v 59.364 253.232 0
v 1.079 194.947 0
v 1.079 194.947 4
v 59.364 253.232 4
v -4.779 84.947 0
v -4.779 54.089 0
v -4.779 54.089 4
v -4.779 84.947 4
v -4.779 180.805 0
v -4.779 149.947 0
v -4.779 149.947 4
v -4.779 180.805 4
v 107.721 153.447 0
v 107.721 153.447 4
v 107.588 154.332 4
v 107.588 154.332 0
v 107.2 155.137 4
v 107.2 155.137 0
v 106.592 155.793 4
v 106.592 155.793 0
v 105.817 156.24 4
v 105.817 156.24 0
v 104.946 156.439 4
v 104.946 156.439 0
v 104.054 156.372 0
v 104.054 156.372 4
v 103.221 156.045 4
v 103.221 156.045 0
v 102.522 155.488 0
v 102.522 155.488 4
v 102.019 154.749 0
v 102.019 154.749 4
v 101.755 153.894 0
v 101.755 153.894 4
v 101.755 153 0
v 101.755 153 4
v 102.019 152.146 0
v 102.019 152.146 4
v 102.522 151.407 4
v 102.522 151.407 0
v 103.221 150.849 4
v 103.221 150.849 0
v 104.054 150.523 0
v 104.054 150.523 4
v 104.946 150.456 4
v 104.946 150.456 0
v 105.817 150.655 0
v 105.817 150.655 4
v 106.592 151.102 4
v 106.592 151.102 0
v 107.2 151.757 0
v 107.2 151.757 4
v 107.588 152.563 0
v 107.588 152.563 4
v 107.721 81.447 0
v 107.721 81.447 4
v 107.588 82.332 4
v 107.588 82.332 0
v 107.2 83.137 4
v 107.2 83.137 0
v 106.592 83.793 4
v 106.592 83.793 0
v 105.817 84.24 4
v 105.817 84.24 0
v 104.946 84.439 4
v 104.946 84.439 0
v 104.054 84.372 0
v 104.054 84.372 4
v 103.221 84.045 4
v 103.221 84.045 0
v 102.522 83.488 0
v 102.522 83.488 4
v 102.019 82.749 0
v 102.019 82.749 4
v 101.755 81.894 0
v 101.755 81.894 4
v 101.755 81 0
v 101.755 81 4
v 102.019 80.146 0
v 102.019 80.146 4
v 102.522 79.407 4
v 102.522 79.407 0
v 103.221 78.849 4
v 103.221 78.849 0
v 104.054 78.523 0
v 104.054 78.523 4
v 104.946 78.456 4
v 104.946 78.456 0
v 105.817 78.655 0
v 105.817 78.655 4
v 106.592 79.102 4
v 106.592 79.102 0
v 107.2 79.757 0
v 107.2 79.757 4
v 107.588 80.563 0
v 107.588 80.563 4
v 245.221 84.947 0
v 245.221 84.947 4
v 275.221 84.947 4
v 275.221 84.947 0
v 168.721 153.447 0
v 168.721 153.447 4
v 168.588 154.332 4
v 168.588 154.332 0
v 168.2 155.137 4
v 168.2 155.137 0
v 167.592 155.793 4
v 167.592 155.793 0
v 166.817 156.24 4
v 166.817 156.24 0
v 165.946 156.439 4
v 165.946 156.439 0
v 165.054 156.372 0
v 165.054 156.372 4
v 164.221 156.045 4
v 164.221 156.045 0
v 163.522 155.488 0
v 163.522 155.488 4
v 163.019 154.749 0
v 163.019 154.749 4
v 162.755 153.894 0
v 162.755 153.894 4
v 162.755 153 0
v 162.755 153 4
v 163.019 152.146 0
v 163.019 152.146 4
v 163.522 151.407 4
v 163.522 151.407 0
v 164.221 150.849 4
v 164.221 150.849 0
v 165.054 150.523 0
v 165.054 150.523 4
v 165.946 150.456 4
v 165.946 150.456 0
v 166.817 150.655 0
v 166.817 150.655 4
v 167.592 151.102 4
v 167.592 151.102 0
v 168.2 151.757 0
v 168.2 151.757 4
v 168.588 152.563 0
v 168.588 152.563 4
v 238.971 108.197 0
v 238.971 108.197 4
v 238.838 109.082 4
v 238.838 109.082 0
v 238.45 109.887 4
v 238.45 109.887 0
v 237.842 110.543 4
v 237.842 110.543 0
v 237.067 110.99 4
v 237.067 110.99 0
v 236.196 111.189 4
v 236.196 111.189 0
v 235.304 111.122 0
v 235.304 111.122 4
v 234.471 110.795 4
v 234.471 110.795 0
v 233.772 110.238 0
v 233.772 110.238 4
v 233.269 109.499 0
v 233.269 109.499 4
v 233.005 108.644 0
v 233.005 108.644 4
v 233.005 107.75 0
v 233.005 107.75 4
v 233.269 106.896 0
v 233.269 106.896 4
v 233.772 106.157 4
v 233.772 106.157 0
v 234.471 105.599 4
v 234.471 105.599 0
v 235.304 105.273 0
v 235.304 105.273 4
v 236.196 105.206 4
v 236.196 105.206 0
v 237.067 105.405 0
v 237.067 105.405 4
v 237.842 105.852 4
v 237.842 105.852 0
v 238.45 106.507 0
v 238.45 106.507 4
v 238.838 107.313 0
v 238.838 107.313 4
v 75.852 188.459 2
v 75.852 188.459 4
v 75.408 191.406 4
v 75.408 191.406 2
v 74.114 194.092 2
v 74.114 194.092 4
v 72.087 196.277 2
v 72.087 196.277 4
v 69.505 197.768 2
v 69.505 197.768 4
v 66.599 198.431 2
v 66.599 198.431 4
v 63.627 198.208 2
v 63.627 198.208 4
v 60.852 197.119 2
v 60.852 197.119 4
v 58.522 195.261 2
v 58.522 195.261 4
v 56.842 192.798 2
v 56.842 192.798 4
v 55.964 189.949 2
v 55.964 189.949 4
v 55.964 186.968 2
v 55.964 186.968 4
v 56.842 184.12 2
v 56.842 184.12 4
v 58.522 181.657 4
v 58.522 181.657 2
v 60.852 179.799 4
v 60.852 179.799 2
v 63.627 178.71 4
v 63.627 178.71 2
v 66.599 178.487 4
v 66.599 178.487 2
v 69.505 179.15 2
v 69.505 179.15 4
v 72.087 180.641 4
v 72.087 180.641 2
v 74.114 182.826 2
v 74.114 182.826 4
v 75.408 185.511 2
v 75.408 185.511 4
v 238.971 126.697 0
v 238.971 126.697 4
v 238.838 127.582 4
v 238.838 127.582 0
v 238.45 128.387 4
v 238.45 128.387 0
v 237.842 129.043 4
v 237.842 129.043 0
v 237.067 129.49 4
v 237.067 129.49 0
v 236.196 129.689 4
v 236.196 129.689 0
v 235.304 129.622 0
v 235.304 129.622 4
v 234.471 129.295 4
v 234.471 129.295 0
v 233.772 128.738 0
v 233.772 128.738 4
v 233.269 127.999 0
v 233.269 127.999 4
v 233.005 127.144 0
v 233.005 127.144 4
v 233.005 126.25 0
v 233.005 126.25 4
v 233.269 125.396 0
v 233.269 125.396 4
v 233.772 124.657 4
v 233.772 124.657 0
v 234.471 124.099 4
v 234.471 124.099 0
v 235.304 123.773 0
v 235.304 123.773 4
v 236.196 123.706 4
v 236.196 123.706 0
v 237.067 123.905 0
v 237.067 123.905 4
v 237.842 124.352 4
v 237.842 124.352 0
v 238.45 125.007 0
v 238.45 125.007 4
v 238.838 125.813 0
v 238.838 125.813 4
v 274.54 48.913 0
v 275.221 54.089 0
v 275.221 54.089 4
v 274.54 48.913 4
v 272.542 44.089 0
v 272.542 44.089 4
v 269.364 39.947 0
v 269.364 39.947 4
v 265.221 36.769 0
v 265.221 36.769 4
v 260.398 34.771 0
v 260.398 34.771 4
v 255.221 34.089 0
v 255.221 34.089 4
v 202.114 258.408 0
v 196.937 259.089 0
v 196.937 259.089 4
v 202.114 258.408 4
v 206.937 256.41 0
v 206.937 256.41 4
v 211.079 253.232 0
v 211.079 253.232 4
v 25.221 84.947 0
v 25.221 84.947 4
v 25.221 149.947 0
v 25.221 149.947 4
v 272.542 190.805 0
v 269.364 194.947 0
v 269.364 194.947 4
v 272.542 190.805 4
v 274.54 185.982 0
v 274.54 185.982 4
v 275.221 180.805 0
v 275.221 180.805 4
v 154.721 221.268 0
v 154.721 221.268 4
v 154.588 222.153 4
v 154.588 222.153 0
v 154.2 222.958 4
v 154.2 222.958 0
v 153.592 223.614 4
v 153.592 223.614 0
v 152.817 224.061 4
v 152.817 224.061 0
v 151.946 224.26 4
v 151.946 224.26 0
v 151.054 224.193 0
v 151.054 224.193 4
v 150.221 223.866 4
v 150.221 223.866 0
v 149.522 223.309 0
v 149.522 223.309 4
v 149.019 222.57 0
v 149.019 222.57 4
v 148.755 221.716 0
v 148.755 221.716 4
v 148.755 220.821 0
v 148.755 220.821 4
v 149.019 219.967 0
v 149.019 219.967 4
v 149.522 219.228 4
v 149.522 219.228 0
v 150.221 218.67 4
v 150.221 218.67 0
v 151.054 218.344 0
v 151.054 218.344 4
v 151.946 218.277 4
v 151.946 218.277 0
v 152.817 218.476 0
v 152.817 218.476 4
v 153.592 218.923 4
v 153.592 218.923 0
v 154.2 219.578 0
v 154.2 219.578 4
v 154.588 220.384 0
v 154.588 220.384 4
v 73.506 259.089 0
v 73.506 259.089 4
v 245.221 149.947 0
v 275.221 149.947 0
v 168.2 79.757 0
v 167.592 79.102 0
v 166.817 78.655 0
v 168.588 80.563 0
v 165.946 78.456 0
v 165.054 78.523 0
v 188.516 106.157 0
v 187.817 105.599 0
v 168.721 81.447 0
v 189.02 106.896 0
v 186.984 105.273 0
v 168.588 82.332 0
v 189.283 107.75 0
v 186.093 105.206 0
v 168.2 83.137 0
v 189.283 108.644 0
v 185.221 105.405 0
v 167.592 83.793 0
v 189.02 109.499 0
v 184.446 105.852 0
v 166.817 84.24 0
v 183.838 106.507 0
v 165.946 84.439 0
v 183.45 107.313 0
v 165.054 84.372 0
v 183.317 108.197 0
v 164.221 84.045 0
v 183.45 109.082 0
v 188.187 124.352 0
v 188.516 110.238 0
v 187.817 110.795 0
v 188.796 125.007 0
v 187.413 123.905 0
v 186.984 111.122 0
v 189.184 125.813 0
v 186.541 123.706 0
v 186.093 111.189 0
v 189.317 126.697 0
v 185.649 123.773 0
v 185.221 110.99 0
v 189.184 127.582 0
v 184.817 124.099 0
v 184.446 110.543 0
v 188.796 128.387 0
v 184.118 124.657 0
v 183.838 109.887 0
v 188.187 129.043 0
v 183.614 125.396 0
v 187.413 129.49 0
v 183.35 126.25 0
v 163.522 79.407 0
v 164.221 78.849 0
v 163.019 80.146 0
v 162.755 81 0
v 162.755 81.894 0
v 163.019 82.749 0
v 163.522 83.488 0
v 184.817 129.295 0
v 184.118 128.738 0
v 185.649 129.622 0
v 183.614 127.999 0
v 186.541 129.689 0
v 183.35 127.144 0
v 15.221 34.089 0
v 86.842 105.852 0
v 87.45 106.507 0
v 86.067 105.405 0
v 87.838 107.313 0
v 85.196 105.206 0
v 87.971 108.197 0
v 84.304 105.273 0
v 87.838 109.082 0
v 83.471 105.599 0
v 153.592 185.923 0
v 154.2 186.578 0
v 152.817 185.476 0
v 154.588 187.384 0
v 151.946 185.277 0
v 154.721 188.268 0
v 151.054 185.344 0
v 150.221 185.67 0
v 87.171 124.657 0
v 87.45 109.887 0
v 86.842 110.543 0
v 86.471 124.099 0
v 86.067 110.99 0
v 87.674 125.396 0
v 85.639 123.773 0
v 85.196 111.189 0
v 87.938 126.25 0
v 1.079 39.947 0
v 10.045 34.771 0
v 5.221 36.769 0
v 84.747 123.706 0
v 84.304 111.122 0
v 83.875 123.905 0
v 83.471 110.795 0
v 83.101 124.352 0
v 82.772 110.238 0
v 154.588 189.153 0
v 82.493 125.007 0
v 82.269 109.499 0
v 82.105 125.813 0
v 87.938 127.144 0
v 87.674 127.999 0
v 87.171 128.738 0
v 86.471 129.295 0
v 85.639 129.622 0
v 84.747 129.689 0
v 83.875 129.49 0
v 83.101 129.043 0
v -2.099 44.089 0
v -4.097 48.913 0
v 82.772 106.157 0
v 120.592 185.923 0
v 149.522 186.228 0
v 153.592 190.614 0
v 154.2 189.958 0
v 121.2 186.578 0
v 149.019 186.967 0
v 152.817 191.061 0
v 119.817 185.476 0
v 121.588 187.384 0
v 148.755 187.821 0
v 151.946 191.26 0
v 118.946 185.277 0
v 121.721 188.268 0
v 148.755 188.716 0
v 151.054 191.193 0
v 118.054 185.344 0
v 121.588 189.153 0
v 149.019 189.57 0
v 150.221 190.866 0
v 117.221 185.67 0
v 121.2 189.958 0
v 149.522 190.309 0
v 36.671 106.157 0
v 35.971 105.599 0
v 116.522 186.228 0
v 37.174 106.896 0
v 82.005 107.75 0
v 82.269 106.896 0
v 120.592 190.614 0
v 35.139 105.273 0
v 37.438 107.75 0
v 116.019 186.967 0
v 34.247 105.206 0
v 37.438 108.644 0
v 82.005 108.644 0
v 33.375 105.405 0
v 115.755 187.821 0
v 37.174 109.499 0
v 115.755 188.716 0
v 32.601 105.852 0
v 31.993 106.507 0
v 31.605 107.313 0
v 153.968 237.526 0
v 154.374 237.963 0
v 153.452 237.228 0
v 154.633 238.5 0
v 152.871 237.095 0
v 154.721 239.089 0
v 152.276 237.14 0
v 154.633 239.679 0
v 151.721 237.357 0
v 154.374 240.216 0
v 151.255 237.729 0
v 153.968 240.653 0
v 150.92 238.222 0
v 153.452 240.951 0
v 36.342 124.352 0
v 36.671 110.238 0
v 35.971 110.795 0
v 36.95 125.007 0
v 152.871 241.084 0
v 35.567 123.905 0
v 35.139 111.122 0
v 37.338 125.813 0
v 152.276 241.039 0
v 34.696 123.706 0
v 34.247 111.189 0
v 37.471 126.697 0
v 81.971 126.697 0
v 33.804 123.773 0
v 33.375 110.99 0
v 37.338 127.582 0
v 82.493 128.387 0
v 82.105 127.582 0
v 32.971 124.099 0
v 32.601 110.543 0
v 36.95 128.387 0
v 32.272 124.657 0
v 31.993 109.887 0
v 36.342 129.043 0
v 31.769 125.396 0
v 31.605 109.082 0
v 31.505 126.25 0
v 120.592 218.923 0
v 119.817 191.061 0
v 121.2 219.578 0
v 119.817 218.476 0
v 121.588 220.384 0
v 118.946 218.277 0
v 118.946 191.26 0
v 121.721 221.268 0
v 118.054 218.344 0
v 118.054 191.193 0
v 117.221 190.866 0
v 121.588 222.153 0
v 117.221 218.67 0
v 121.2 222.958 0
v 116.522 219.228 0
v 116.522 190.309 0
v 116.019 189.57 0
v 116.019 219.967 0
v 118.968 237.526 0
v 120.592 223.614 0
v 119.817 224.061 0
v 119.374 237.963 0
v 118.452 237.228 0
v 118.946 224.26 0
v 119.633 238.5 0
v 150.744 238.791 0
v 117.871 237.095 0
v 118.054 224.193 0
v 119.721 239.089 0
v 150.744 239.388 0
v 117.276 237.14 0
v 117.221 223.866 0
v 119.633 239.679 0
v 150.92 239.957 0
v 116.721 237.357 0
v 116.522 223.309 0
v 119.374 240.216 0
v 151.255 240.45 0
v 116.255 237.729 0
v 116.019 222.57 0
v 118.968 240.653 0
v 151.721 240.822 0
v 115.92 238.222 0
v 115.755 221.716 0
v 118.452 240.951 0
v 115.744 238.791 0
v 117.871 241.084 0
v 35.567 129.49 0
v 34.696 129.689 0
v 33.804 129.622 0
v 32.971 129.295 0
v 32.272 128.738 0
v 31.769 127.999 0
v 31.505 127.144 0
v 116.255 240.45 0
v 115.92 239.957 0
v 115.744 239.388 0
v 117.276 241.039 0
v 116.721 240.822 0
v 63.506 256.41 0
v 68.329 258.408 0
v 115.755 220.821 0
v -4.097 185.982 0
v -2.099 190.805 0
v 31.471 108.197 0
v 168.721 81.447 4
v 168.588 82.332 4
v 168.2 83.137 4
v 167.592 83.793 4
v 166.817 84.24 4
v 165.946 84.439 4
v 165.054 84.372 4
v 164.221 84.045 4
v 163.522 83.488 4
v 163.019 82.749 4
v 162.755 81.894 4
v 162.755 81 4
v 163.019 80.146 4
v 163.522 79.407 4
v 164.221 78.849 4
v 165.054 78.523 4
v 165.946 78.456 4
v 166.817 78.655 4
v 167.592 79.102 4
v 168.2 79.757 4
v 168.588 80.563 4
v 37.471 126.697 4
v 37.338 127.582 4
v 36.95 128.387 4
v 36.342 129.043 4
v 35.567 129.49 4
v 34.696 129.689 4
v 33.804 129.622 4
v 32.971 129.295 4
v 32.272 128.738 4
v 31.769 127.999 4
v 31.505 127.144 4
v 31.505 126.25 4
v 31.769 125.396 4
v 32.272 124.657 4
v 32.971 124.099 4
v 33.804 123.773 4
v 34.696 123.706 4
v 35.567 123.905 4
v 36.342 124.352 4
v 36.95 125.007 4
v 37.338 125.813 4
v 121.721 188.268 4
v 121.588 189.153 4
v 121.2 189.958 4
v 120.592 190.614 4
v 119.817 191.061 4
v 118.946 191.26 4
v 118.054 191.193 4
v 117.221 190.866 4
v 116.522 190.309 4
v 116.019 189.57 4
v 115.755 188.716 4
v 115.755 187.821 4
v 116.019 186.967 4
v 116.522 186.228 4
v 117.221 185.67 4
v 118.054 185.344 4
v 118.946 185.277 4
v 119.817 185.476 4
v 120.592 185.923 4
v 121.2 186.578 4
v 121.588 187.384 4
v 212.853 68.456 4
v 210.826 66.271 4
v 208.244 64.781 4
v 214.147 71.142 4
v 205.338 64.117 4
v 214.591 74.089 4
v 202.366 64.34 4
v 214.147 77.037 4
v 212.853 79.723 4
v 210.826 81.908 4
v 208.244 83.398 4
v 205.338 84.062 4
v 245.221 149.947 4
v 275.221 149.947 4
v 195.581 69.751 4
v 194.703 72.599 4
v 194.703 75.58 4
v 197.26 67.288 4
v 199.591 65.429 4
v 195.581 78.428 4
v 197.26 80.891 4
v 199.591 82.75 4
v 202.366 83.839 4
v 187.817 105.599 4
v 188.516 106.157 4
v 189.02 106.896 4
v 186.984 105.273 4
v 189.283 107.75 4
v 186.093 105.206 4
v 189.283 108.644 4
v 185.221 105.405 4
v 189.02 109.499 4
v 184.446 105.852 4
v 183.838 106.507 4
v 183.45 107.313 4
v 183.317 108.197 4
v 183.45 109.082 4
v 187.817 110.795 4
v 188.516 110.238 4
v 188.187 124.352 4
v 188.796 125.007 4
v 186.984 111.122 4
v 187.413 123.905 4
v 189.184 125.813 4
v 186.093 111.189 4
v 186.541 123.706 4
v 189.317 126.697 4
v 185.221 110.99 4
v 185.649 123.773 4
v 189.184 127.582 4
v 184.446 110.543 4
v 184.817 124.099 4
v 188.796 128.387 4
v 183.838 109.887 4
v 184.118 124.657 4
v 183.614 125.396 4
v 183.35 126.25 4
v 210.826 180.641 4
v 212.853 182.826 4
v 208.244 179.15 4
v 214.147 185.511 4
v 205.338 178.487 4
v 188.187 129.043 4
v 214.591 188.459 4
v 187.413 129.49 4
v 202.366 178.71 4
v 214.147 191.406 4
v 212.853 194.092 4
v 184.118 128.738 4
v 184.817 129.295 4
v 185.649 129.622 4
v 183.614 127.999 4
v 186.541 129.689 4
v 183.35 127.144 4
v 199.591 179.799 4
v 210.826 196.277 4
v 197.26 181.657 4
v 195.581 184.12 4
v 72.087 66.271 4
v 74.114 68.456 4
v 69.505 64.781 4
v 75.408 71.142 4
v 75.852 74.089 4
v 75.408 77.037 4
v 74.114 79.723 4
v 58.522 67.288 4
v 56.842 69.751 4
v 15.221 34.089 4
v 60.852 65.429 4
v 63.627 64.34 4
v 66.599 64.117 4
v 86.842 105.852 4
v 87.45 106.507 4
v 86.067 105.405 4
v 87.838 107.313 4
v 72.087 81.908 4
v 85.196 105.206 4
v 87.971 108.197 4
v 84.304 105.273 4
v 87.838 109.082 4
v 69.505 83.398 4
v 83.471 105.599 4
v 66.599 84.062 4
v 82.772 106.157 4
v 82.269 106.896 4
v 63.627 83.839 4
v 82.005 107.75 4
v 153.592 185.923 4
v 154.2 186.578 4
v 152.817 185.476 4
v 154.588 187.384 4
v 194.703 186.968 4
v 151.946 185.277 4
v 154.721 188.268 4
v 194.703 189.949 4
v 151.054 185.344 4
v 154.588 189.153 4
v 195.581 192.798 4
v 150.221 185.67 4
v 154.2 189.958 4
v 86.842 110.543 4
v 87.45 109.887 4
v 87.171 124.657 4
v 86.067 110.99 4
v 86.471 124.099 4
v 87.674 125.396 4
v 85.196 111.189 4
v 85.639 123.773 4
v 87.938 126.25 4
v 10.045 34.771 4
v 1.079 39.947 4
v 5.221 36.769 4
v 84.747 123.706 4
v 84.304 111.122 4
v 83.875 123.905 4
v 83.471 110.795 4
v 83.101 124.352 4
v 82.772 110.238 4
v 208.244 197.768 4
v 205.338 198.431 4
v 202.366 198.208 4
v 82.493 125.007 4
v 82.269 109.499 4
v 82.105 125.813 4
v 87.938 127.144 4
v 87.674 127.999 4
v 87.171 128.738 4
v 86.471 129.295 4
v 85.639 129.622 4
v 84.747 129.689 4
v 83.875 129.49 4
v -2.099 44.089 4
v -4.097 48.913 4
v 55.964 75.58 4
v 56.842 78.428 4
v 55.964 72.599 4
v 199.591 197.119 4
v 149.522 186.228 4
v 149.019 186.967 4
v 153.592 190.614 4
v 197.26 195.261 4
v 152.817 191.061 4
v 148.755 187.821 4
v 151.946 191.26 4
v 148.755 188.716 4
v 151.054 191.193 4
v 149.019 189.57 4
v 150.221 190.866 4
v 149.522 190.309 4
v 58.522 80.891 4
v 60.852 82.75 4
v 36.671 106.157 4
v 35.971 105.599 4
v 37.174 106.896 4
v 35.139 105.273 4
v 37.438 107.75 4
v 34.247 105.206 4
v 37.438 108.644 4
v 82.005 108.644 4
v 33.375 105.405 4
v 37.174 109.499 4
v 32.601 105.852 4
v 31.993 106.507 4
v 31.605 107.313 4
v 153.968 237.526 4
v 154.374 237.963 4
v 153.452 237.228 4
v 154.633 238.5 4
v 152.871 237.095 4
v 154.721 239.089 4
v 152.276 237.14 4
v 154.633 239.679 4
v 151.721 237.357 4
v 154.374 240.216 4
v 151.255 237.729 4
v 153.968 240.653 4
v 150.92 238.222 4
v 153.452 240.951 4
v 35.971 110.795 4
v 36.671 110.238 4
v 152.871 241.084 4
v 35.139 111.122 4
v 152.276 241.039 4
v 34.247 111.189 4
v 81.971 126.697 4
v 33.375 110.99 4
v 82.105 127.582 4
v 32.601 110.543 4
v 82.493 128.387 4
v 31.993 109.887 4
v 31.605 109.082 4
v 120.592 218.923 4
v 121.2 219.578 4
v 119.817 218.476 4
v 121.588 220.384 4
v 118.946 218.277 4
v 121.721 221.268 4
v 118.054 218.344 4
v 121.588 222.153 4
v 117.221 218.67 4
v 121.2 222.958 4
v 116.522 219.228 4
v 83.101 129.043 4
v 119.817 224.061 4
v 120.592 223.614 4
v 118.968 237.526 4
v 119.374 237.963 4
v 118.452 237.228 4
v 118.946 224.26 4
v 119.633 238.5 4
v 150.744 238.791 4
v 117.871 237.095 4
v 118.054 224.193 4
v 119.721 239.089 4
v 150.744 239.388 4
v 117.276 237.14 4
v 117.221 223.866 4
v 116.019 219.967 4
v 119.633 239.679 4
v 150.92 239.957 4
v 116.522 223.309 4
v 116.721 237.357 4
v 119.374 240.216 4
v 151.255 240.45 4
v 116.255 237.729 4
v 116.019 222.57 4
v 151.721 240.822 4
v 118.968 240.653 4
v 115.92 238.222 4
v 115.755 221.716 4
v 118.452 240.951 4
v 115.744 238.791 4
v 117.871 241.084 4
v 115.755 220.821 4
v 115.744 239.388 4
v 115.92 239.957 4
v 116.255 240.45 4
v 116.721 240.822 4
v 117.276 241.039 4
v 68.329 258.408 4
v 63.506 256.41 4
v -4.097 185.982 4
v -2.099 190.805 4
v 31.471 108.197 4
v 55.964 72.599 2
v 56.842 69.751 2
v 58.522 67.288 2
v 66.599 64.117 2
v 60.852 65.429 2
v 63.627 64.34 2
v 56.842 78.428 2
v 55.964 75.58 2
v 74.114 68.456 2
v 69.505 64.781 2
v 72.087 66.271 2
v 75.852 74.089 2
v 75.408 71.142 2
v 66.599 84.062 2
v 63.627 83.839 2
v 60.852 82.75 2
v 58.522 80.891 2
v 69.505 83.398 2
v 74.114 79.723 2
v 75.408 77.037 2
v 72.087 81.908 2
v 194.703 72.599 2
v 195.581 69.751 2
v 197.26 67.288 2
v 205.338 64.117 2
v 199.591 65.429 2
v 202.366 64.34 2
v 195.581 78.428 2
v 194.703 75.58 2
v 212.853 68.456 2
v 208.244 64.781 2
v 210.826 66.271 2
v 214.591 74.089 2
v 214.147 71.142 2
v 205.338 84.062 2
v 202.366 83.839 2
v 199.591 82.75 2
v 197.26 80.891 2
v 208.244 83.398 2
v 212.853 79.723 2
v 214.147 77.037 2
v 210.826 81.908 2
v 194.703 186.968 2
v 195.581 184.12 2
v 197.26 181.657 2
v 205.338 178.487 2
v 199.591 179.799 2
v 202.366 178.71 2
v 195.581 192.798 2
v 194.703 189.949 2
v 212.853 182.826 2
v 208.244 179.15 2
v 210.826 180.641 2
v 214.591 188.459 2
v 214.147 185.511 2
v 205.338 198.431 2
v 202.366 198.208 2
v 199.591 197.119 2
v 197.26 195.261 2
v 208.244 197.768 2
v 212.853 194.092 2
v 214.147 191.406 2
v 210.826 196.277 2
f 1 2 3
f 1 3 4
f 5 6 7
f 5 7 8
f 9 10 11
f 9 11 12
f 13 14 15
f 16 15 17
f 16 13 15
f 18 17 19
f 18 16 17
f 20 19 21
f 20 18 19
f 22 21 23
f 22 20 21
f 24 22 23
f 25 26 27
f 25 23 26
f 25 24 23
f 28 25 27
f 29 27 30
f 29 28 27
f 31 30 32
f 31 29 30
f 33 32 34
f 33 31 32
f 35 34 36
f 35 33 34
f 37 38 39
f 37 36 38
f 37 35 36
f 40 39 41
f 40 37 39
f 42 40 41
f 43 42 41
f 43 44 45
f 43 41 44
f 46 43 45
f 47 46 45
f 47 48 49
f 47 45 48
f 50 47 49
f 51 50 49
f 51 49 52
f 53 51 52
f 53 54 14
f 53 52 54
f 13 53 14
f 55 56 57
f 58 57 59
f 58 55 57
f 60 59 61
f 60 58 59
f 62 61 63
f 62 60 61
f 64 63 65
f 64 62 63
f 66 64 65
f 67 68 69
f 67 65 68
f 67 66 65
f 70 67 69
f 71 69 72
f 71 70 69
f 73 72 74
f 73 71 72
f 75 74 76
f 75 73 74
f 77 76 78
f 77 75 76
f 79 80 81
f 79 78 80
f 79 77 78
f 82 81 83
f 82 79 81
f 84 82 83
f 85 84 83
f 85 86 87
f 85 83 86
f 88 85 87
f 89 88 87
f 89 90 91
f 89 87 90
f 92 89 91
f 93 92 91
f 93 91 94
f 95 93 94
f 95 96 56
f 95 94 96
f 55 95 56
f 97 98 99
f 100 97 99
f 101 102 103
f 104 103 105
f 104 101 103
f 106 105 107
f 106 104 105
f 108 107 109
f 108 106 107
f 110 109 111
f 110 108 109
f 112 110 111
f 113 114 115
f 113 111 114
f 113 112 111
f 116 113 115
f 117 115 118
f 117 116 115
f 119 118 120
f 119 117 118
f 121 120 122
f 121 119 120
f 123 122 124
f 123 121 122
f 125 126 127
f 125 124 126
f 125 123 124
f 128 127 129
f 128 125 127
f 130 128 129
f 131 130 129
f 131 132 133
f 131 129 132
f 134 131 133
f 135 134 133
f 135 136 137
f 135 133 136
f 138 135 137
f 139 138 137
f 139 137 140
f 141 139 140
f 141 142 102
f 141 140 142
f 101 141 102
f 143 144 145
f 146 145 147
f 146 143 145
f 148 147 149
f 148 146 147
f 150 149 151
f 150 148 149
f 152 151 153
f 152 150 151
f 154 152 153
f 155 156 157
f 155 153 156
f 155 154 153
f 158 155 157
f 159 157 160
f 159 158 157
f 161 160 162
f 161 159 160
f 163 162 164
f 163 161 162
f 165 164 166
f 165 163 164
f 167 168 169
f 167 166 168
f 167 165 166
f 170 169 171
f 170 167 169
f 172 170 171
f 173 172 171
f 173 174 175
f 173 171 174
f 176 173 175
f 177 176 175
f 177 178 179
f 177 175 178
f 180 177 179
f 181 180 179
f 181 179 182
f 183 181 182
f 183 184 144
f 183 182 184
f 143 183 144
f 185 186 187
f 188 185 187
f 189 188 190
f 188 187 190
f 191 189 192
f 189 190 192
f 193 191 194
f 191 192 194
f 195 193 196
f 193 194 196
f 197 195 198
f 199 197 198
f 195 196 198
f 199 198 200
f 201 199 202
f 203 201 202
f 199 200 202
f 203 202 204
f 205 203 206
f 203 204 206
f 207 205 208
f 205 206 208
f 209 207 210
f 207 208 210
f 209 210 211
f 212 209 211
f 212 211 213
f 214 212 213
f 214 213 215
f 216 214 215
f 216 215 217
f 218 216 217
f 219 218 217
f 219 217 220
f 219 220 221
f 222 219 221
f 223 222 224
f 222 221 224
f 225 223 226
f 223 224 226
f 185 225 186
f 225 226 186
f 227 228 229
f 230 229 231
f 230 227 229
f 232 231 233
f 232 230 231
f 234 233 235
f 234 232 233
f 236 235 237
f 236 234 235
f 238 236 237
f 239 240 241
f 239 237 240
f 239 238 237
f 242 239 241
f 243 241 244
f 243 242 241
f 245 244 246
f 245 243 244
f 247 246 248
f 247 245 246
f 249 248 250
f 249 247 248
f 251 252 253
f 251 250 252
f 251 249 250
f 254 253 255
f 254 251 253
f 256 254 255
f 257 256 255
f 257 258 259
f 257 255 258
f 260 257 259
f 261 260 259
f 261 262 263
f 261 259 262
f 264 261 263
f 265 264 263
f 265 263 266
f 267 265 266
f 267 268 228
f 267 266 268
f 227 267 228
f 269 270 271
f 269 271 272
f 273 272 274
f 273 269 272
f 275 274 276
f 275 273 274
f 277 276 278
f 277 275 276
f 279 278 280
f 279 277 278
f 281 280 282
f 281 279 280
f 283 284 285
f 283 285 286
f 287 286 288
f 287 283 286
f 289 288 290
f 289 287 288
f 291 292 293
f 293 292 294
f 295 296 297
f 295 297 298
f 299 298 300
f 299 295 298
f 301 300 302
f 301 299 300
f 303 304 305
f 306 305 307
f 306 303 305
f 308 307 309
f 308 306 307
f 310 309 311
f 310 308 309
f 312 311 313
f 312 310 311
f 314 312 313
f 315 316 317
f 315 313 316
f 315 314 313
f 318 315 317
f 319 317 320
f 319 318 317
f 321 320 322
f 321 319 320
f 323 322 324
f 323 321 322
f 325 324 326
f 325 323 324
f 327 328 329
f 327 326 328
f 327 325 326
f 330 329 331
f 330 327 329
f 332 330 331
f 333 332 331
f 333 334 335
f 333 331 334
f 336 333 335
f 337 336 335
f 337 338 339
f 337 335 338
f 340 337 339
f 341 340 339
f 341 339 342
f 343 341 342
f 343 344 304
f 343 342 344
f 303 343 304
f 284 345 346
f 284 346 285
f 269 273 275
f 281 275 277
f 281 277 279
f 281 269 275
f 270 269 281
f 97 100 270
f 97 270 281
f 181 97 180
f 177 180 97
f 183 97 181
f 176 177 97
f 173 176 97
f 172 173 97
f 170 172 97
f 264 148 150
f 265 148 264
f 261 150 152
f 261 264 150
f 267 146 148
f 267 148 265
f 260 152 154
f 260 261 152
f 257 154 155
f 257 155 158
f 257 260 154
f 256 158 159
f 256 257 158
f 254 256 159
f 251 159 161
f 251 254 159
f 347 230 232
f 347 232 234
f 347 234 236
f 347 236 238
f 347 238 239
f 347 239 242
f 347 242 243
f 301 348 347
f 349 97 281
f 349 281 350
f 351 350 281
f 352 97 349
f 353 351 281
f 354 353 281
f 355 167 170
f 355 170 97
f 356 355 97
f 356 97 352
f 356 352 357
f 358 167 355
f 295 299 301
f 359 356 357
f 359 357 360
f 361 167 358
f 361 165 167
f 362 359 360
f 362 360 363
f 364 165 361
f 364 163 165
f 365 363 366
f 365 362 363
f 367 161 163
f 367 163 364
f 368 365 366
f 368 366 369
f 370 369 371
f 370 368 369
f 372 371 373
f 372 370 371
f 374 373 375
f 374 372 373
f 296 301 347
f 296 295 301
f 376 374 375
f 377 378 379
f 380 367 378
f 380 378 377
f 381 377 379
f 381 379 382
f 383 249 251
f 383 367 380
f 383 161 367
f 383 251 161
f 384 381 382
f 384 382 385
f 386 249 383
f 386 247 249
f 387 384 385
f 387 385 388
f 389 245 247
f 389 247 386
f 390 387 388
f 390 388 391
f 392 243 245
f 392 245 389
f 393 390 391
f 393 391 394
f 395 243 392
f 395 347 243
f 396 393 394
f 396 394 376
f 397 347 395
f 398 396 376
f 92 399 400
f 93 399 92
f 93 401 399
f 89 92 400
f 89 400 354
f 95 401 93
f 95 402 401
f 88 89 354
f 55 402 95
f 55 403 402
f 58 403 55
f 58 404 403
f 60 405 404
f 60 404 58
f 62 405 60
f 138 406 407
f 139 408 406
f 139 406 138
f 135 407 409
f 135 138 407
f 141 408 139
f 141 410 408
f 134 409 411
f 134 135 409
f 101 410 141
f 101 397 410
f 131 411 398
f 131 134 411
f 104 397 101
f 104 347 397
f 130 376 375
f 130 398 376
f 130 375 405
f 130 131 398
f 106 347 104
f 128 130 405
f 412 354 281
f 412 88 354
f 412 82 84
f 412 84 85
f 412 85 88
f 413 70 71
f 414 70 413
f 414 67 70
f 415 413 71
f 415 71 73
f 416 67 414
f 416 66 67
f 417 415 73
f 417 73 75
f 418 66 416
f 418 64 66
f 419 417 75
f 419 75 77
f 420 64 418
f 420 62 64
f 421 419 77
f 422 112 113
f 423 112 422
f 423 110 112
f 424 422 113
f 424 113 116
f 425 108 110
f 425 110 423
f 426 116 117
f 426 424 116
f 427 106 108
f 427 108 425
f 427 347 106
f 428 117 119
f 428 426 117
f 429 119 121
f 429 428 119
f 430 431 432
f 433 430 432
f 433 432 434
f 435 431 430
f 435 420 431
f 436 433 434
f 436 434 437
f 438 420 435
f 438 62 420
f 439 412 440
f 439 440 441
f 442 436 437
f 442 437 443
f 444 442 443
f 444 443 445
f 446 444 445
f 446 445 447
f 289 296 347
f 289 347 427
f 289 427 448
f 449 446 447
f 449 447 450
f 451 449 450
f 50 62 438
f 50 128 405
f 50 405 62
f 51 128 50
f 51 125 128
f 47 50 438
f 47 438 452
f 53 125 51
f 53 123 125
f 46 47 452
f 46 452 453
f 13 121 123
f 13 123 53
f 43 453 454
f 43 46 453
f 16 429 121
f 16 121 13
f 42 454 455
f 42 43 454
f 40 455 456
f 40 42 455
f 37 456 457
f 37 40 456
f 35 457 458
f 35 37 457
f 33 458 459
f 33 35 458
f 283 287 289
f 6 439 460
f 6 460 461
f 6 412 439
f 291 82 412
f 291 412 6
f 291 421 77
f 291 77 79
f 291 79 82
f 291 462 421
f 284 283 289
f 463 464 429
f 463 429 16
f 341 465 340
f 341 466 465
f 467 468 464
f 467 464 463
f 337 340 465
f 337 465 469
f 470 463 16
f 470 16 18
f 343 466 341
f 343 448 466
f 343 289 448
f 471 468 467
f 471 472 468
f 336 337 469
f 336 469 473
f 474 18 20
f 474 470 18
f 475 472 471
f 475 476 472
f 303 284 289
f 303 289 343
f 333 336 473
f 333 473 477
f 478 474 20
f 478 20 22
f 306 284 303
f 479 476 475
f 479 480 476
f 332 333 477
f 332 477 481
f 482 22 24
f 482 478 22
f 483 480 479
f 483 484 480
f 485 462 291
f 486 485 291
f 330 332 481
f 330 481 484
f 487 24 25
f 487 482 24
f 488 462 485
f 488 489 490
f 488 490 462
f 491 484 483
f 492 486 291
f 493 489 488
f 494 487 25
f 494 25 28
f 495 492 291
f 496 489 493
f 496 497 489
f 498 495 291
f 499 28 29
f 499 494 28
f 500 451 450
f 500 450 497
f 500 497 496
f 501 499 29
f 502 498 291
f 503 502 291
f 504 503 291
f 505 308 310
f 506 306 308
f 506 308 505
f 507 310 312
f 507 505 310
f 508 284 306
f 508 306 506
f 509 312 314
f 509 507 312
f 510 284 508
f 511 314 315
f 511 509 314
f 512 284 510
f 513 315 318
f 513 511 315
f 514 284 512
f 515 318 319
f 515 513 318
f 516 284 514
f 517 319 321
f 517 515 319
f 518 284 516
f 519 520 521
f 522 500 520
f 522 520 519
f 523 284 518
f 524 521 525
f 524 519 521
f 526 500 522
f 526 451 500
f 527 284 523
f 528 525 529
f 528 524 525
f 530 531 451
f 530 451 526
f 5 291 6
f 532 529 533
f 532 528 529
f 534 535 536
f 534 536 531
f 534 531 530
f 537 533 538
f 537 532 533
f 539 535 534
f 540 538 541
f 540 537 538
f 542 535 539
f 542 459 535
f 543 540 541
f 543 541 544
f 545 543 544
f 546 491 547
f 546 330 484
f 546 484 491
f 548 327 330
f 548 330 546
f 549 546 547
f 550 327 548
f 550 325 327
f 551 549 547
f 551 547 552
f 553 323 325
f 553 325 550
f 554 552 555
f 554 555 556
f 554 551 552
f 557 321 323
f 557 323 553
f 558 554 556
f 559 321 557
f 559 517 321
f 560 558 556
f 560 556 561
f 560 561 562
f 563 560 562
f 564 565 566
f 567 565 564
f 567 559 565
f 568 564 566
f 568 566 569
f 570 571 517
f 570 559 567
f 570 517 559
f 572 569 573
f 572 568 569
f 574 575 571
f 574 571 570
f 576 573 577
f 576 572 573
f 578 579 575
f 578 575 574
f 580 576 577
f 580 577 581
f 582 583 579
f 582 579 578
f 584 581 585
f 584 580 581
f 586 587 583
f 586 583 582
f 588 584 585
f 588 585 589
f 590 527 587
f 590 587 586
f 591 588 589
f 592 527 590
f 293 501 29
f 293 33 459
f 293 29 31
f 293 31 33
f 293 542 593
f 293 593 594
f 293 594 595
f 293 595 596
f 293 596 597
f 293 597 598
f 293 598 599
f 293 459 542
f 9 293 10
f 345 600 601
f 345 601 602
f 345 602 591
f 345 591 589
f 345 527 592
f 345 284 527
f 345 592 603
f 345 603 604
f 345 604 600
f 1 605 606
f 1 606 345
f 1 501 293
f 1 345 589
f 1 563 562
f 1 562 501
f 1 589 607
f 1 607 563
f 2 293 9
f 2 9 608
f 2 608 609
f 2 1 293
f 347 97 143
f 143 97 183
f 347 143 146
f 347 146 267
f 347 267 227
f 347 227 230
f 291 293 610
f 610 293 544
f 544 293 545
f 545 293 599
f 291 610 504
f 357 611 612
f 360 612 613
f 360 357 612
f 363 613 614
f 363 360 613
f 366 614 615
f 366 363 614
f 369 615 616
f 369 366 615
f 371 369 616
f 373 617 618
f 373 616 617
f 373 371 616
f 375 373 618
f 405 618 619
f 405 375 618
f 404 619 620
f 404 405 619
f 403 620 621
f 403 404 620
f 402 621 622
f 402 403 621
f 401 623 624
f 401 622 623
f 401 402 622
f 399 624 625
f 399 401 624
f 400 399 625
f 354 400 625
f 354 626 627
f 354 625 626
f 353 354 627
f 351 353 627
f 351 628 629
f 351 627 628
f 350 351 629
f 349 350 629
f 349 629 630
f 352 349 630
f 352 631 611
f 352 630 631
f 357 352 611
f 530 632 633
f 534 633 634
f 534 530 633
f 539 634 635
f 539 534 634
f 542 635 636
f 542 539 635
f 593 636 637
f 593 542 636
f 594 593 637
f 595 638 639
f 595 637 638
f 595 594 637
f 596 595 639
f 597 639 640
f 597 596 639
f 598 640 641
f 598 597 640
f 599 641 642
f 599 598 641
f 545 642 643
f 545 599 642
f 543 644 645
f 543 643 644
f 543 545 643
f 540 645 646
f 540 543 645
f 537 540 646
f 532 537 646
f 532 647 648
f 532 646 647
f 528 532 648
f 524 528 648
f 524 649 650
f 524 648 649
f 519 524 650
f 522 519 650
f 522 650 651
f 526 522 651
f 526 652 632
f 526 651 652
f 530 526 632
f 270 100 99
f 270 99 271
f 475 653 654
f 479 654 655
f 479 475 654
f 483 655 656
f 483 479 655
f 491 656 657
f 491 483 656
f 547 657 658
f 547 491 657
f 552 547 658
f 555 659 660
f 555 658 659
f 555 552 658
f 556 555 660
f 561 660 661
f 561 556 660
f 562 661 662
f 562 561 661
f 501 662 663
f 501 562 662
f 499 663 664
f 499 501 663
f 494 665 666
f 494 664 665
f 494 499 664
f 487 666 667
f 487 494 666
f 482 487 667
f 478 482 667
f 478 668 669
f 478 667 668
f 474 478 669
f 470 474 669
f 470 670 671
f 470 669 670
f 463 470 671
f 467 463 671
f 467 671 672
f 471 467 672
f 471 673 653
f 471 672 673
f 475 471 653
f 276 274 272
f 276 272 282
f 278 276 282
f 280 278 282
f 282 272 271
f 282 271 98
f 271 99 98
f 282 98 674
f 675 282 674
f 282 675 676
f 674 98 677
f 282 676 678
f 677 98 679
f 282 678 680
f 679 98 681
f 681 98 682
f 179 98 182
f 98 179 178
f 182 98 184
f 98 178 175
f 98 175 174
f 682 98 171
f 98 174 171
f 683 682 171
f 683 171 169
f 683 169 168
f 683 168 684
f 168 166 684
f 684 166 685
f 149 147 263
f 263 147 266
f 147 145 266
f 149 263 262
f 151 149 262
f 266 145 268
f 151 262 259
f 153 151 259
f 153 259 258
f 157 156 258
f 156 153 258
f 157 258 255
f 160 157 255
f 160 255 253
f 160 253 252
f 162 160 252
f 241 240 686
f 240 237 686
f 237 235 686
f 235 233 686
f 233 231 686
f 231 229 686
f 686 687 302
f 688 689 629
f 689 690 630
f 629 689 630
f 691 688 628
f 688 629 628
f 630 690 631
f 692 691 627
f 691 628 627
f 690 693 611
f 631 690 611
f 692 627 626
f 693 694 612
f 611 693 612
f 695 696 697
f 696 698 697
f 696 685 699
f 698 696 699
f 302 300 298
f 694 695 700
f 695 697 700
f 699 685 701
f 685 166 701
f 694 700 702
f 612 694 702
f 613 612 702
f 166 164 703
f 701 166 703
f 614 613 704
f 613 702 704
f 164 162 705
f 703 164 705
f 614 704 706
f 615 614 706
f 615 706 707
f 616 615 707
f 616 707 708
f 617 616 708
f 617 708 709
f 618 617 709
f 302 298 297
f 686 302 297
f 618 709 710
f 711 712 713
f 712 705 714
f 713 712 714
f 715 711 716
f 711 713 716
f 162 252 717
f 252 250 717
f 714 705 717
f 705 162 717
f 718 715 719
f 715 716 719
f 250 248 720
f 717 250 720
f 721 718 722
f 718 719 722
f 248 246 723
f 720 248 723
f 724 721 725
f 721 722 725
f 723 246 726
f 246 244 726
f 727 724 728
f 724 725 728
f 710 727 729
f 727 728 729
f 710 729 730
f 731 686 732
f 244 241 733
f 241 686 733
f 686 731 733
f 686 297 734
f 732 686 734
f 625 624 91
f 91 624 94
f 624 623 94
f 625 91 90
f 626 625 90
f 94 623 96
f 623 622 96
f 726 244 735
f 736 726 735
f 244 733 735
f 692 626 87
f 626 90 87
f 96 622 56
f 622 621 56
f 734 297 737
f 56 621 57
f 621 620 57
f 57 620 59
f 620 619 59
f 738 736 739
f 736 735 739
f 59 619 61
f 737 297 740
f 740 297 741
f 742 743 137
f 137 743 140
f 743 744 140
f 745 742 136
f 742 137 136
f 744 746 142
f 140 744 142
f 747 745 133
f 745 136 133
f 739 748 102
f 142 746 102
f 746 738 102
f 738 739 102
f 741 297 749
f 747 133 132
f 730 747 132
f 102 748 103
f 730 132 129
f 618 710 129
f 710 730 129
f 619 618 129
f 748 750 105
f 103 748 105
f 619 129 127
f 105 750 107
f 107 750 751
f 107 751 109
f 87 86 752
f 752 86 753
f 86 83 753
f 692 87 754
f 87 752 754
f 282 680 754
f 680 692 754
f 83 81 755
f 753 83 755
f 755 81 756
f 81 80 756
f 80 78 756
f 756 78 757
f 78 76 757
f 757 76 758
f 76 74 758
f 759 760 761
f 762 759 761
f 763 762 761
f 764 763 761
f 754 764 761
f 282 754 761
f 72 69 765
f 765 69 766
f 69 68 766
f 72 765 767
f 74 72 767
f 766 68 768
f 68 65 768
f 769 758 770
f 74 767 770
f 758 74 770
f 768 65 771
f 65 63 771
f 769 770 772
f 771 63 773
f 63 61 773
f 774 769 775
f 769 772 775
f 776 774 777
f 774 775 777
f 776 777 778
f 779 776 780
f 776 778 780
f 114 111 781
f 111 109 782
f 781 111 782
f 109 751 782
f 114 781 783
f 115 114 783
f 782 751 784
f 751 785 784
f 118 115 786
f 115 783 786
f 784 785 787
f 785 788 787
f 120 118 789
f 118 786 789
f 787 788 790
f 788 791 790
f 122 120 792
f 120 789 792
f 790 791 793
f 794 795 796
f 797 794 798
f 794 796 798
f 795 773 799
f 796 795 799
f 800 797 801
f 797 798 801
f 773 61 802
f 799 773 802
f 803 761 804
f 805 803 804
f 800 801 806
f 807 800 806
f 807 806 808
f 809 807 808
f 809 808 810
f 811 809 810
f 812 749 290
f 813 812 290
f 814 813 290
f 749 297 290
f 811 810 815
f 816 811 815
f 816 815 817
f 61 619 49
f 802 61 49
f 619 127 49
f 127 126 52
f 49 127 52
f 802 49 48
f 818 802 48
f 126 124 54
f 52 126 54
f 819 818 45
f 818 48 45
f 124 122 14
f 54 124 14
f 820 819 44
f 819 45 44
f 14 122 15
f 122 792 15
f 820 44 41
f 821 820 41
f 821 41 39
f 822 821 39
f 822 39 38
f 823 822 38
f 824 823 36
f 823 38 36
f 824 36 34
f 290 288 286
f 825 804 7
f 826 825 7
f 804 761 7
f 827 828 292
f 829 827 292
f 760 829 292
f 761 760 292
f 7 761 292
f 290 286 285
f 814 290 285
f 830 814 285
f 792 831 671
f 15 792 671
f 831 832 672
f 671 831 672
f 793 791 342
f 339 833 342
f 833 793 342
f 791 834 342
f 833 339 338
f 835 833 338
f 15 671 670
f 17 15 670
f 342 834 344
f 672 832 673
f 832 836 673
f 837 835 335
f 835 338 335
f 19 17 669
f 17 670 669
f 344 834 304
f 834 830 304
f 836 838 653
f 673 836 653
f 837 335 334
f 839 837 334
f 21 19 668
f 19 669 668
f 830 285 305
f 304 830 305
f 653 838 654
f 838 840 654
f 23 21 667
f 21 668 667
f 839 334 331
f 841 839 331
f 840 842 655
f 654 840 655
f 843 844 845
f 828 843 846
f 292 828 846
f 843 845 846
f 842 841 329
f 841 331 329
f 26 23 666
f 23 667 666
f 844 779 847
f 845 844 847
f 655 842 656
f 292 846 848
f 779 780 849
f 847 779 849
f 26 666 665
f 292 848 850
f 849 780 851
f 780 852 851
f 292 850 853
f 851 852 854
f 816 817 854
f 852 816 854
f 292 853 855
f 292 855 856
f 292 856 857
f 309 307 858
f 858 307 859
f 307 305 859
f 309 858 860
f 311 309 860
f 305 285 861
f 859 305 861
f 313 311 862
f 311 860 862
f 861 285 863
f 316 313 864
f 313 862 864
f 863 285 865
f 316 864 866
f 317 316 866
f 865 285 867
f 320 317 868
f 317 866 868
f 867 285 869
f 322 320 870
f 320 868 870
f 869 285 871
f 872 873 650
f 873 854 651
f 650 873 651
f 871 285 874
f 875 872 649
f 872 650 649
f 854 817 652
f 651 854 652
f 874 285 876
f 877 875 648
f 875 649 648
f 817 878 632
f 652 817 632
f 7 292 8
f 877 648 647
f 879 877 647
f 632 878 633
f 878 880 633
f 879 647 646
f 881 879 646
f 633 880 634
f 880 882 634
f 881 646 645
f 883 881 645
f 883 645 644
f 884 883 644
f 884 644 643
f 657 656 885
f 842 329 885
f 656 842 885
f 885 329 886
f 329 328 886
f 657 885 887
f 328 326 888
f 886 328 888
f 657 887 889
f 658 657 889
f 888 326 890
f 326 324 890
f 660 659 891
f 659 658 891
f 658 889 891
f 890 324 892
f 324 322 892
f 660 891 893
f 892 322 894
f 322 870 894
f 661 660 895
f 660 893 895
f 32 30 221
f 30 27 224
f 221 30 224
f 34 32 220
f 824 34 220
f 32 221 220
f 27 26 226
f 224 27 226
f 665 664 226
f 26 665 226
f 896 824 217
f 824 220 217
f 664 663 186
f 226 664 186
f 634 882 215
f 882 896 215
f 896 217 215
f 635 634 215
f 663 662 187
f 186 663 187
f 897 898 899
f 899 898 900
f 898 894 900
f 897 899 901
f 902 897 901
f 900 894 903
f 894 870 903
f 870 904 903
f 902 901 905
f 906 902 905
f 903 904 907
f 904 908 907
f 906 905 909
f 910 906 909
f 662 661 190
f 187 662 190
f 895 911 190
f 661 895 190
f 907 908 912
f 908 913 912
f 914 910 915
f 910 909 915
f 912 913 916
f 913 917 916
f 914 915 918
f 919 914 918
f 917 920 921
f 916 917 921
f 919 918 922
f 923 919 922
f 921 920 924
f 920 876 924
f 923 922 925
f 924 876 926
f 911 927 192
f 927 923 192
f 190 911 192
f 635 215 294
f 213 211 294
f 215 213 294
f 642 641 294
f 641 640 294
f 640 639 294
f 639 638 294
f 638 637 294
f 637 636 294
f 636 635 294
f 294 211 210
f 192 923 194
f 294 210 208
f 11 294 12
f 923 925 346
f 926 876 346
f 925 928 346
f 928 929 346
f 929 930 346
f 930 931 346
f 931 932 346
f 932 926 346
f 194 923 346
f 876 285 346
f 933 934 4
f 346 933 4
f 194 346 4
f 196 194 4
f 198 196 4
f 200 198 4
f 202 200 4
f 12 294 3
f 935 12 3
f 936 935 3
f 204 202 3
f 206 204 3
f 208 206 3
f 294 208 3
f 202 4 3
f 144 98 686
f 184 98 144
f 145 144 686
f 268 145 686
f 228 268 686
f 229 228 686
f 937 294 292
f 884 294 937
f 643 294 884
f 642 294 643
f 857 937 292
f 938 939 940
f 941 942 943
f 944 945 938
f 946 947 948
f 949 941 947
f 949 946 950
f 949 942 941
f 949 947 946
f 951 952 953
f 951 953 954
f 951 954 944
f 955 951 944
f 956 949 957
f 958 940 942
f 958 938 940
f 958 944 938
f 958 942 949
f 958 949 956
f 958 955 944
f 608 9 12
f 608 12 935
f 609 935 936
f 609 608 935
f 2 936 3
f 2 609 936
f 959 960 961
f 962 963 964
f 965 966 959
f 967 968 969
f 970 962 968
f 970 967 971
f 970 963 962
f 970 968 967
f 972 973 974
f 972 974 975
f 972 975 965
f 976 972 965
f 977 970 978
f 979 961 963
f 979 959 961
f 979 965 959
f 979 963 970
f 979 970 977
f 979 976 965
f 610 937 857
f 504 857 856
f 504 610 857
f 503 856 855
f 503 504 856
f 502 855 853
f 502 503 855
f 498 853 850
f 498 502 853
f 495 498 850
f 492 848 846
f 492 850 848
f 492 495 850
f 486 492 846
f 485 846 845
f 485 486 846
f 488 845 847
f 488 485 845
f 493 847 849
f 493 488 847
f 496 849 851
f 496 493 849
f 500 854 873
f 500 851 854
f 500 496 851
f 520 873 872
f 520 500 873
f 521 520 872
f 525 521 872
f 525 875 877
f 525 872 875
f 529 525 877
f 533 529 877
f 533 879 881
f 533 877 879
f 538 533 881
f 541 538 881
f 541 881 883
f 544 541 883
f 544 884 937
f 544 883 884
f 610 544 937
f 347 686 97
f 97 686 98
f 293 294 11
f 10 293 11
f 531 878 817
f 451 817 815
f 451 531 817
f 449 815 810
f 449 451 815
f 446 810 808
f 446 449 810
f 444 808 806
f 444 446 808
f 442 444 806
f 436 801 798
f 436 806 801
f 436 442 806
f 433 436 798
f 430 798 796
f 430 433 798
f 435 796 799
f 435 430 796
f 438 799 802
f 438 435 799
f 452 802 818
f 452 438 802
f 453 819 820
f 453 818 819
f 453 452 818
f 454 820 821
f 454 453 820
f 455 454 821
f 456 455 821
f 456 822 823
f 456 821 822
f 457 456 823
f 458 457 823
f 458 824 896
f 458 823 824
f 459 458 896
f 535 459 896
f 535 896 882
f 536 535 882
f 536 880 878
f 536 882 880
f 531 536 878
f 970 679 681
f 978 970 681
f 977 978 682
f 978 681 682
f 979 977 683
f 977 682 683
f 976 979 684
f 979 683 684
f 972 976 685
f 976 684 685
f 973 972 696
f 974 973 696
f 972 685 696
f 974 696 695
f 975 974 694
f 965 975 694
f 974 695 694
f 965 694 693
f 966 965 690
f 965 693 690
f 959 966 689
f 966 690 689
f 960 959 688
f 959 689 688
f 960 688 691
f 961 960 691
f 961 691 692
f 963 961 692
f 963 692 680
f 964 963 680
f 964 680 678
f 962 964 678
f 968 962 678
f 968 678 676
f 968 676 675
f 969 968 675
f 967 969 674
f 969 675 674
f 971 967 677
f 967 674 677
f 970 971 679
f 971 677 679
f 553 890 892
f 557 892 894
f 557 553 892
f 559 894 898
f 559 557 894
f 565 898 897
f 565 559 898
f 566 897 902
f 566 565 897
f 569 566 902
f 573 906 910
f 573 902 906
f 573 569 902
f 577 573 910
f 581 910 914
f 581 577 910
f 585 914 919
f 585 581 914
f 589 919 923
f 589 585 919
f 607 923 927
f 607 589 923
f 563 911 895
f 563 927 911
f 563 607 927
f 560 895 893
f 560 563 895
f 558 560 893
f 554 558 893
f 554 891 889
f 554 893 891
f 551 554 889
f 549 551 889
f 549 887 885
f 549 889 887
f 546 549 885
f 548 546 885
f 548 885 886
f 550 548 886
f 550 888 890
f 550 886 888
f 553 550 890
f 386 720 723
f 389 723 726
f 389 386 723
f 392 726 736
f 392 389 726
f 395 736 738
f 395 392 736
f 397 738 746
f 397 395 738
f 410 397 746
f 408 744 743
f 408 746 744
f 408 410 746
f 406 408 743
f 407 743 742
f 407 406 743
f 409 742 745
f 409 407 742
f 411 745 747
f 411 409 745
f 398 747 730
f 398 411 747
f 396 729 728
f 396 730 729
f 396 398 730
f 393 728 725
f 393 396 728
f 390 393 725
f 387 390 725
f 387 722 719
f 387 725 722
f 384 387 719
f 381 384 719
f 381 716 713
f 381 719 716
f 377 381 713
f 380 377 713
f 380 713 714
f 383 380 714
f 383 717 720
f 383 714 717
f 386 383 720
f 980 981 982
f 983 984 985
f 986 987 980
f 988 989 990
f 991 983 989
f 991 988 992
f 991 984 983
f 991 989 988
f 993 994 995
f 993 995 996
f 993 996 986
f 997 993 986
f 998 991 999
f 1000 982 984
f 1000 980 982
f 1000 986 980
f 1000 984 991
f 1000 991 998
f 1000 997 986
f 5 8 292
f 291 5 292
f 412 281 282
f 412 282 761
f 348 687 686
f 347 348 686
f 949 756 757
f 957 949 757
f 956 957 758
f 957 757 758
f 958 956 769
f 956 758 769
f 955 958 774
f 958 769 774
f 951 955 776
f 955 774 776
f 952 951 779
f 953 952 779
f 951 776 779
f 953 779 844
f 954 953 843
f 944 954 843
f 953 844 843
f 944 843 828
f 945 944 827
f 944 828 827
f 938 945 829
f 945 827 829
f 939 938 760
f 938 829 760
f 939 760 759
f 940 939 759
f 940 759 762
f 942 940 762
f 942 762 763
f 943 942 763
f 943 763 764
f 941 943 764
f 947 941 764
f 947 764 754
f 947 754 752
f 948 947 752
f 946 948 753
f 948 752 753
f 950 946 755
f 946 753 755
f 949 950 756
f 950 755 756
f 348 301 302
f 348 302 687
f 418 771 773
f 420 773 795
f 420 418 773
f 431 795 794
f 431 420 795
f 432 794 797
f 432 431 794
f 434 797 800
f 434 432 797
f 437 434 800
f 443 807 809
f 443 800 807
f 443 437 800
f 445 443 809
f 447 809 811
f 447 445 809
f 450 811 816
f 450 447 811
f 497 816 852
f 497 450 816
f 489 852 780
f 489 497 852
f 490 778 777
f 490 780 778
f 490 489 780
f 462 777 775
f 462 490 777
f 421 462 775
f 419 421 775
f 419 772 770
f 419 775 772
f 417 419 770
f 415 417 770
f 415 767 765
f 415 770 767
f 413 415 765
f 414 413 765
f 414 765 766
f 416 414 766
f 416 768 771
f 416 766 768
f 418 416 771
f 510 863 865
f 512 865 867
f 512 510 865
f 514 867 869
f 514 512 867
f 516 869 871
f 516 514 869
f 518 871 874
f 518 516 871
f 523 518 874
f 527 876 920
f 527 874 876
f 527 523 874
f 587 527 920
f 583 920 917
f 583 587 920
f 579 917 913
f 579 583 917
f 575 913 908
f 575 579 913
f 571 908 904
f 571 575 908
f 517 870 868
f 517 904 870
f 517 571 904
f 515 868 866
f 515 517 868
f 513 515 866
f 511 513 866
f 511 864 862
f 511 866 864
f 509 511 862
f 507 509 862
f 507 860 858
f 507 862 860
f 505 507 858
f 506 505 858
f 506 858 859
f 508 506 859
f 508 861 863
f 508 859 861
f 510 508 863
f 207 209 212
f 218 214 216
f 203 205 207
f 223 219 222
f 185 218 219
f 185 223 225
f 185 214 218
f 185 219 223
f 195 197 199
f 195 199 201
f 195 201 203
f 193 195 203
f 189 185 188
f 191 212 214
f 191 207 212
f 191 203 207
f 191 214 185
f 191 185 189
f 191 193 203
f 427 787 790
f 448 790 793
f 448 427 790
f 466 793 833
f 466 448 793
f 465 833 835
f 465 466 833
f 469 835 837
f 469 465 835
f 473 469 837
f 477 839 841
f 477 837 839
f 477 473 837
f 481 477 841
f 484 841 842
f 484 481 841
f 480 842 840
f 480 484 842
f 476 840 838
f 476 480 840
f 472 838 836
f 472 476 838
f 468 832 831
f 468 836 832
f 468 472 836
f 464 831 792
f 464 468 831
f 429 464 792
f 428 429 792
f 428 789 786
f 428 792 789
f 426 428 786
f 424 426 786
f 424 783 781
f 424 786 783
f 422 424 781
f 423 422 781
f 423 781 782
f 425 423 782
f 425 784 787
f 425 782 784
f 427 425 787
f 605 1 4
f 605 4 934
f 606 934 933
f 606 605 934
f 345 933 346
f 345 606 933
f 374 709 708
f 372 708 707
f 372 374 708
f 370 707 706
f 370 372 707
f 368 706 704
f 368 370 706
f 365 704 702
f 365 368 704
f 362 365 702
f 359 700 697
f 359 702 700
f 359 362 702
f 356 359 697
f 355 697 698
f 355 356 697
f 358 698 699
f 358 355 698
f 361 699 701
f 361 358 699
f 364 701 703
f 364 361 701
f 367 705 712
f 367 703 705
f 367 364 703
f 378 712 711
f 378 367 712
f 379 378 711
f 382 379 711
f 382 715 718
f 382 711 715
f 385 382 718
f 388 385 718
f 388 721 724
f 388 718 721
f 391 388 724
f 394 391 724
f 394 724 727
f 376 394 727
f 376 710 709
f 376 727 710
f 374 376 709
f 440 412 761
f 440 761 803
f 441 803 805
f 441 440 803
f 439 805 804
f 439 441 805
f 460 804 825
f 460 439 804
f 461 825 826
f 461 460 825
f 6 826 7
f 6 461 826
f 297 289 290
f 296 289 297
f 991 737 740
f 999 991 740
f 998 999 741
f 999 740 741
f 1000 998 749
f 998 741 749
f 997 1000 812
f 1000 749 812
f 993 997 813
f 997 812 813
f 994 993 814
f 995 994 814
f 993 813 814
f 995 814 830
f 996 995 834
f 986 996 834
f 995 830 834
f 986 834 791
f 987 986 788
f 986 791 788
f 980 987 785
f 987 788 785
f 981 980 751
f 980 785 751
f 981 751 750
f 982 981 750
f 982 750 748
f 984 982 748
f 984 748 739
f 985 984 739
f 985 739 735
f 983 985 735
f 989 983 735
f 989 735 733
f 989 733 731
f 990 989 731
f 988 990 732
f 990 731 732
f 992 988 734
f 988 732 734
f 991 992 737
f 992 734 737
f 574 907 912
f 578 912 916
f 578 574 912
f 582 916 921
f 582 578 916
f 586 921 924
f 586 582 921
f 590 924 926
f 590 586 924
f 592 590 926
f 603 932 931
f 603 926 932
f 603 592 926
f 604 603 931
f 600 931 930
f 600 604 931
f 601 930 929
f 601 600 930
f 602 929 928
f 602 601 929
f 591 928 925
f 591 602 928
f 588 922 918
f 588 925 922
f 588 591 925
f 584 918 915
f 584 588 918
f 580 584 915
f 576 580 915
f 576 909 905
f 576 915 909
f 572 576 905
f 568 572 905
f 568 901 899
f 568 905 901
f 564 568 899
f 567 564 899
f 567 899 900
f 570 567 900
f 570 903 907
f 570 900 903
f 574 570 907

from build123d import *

# Parameters (mm, degrees)
EXTRUDE_1_DEPTH      = 4
SKETCH_1950_R        = 3
CUT_EXTRUDE_3_DEPTH  = 10
L298N_R              = 3
CUT_EXTRUDE_5_DEPTH  = 10
SKETCH_486_R         = 3
CUT_EXTRUDE_7_DEPTH  = 10
CUT_EXTRUDE_8_DEPTH  = 10
SKETCH_2788_R        = 2
CUT_EXTRUDE_10_DEPTH = 10
SKETCH_11_R          = 10
CUT_EXTRUDE_11_DEPTH = 2


with BuildPart() as part:
    # 草图3 → 凸台-拉伸1 (new body)
    with BuildSketch(Plane.XY):
        with BuildLine():
            Line((73.505746565, 259.089488009), (196.937204075, 259.089488009))
            ThreePointArc((196.937204075, 259.089488009), (204.590872722, 257.56707866), (211.079339699, 253.231623633))
            Line((211.079339699, 253.231623633), (269.363610946, 194.947352386))
            ThreePointArc((269.363610946, 194.947352386), (273.699065973, 188.458885409), (275.221475323, 180.805216762))
            Line((275.221475323, 180.805216762), (275.221475323, 54.089488009))
            ThreePointArc((275.221475323, 54.089488009), (269.363610946, 39.947352386), (255.221475323, 34.089488009))
            Line((255.221475323, 34.089488009), (15.221475318, 34.089488009))
            ThreePointArc((15.221475318, 34.089488009), (1.079339694, 39.947352386), (-4.778524682, 54.089488009))
            Line((-4.778524682, 54.089488009), (-4.778524682, 180.805216762))
            ThreePointArc((-4.778524682, 180.805216762), (-3.256115333, 188.458885409), (1.079339694, 194.947352386))
            Line((1.079339694, 194.947352386), (59.363610941, 253.231623633))
            ThreePointArc((59.363610941, 253.231623633), (65.852077918, 257.56707866), (73.505746565, 259.089488009))
        make_face()
    extrude(amount=EXTRUDE_1_DEPTH)

    # Sketch 1950 → 切除-拉伸3 (cut)
    with BuildSketch(Plane.XY):
        with Locations((235.971475323, 126.697352386)):
            Circle(SKETCH_1950_R)
        with Locations((186.316790846, 126.697352386)):
            Circle(SKETCH_1950_R)
        with Locations((84.971475318, 108.197352386)):
            Circle(SKETCH_1950_R)
        with Locations((235.971475323, 108.197352386)):
            Circle(SKETCH_1950_R)
        with Locations(Location((186.316790846, 108.197352386, 0), (0, 0, 180))):
            Circle(SKETCH_1950_R)
        with Locations(Location((84.971475318, 126.697352386, 0), (0, 0, 180))):
            Circle(SKETCH_1950_R)
        with Locations((34.471475318, 126.697352386)):
            Circle(SKETCH_1950_R)
        with Locations(Location((34.471475318, 108.197352386, 0), (0, 0, 180))):
            Circle(SKETCH_1950_R)
    extrude(amount=CUT_EXTRUDE_3_DEPTH, mode=Mode.SUBTRACT)

    # L298N → 切除-拉伸5 (cut)
    with BuildSketch(Plane.XY):
        with Locations((118.72147532, 188.268420197)):
            Circle(L298N_R)
        with Locations((118.72147532, 221.268420197)):
            Circle(L298N_R)
        with Locations((151.72147532, 221.268420197)):
            Circle(L298N_R)
        with Locations((151.72147532, 188.268420197)):
            Circle(L298N_R)
    extrude(amount=CUT_EXTRUDE_5_DEPTH, mode=Mode.SUBTRACT)

    # Sketch 486 → 切除-拉伸7 (cut)
    with BuildSketch(Plane.XY):
        with Locations((104.72147532, 153.447352386)):
            Circle(SKETCH_486_R)
        with Locations((104.72147532, 81.447352386)):
            Circle(SKETCH_486_R)
        with Locations((165.72147532, 81.447352386)):
            Circle(SKETCH_486_R)
        with Locations((165.72147532, 153.447352386)):
            Circle(SKETCH_486_R)
    extrude(amount=CUT_EXTRUDE_7_DEPTH, mode=Mode.SUBTRACT)

    # Sketch 1082 → 切除-拉伸8 (cut)
    with BuildSketch(Plane.XY.offset(4)):
        Polygon((-4.778524682, 149.947352386), (-4.778524682, 84.947352386), (25.221475318, 84.947352386), (25.221475318, 149.947352386), (7.221475318, 149.947352386), align=None)
        Polygon((245.221475323, 149.947352386), (245.221475323, 84.947352386), (275.221475323, 84.947352386), (275.221475323, 149.947352386), (263.221475323, 149.947352386), align=None)
    extrude(amount=-CUT_EXTRUDE_8_DEPTH, mode=Mode.SUBTRACT)

    # Sketch 2788 → 切除-拉伸10 (cut)
    with BuildSketch(Plane.XY):
        with Locations((117.72147532, 239.089488009)):
            Circle(SKETCH_2788_R)
        with Locations((152.72147532, 239.089488009)):
            Circle(SKETCH_2788_R)
    extrude(amount=CUT_EXTRUDE_10_DEPTH, mode=Mode.SUBTRACT)

    # 草图11 → 切除-拉伸11 (cut)
    with BuildSketch(Plane.XY.offset(4)):
        with Locations((65.852077918, 188.458885409)):
            Circle(SKETCH_11_R)
        with Locations((204.590872722, 188.458885409)):
            Circle(SKETCH_11_R)
        with Locations((65.852077918, 74.089488009)):
            Circle(SKETCH_11_R)
        with Locations((204.590872722, 74.089488009)):
            Circle(SKETCH_11_R)
    extrude(amount=-CUT_EXTRUDE_11_DEPTH, mode=Mode.SUBTRACT)


solid = part.part
